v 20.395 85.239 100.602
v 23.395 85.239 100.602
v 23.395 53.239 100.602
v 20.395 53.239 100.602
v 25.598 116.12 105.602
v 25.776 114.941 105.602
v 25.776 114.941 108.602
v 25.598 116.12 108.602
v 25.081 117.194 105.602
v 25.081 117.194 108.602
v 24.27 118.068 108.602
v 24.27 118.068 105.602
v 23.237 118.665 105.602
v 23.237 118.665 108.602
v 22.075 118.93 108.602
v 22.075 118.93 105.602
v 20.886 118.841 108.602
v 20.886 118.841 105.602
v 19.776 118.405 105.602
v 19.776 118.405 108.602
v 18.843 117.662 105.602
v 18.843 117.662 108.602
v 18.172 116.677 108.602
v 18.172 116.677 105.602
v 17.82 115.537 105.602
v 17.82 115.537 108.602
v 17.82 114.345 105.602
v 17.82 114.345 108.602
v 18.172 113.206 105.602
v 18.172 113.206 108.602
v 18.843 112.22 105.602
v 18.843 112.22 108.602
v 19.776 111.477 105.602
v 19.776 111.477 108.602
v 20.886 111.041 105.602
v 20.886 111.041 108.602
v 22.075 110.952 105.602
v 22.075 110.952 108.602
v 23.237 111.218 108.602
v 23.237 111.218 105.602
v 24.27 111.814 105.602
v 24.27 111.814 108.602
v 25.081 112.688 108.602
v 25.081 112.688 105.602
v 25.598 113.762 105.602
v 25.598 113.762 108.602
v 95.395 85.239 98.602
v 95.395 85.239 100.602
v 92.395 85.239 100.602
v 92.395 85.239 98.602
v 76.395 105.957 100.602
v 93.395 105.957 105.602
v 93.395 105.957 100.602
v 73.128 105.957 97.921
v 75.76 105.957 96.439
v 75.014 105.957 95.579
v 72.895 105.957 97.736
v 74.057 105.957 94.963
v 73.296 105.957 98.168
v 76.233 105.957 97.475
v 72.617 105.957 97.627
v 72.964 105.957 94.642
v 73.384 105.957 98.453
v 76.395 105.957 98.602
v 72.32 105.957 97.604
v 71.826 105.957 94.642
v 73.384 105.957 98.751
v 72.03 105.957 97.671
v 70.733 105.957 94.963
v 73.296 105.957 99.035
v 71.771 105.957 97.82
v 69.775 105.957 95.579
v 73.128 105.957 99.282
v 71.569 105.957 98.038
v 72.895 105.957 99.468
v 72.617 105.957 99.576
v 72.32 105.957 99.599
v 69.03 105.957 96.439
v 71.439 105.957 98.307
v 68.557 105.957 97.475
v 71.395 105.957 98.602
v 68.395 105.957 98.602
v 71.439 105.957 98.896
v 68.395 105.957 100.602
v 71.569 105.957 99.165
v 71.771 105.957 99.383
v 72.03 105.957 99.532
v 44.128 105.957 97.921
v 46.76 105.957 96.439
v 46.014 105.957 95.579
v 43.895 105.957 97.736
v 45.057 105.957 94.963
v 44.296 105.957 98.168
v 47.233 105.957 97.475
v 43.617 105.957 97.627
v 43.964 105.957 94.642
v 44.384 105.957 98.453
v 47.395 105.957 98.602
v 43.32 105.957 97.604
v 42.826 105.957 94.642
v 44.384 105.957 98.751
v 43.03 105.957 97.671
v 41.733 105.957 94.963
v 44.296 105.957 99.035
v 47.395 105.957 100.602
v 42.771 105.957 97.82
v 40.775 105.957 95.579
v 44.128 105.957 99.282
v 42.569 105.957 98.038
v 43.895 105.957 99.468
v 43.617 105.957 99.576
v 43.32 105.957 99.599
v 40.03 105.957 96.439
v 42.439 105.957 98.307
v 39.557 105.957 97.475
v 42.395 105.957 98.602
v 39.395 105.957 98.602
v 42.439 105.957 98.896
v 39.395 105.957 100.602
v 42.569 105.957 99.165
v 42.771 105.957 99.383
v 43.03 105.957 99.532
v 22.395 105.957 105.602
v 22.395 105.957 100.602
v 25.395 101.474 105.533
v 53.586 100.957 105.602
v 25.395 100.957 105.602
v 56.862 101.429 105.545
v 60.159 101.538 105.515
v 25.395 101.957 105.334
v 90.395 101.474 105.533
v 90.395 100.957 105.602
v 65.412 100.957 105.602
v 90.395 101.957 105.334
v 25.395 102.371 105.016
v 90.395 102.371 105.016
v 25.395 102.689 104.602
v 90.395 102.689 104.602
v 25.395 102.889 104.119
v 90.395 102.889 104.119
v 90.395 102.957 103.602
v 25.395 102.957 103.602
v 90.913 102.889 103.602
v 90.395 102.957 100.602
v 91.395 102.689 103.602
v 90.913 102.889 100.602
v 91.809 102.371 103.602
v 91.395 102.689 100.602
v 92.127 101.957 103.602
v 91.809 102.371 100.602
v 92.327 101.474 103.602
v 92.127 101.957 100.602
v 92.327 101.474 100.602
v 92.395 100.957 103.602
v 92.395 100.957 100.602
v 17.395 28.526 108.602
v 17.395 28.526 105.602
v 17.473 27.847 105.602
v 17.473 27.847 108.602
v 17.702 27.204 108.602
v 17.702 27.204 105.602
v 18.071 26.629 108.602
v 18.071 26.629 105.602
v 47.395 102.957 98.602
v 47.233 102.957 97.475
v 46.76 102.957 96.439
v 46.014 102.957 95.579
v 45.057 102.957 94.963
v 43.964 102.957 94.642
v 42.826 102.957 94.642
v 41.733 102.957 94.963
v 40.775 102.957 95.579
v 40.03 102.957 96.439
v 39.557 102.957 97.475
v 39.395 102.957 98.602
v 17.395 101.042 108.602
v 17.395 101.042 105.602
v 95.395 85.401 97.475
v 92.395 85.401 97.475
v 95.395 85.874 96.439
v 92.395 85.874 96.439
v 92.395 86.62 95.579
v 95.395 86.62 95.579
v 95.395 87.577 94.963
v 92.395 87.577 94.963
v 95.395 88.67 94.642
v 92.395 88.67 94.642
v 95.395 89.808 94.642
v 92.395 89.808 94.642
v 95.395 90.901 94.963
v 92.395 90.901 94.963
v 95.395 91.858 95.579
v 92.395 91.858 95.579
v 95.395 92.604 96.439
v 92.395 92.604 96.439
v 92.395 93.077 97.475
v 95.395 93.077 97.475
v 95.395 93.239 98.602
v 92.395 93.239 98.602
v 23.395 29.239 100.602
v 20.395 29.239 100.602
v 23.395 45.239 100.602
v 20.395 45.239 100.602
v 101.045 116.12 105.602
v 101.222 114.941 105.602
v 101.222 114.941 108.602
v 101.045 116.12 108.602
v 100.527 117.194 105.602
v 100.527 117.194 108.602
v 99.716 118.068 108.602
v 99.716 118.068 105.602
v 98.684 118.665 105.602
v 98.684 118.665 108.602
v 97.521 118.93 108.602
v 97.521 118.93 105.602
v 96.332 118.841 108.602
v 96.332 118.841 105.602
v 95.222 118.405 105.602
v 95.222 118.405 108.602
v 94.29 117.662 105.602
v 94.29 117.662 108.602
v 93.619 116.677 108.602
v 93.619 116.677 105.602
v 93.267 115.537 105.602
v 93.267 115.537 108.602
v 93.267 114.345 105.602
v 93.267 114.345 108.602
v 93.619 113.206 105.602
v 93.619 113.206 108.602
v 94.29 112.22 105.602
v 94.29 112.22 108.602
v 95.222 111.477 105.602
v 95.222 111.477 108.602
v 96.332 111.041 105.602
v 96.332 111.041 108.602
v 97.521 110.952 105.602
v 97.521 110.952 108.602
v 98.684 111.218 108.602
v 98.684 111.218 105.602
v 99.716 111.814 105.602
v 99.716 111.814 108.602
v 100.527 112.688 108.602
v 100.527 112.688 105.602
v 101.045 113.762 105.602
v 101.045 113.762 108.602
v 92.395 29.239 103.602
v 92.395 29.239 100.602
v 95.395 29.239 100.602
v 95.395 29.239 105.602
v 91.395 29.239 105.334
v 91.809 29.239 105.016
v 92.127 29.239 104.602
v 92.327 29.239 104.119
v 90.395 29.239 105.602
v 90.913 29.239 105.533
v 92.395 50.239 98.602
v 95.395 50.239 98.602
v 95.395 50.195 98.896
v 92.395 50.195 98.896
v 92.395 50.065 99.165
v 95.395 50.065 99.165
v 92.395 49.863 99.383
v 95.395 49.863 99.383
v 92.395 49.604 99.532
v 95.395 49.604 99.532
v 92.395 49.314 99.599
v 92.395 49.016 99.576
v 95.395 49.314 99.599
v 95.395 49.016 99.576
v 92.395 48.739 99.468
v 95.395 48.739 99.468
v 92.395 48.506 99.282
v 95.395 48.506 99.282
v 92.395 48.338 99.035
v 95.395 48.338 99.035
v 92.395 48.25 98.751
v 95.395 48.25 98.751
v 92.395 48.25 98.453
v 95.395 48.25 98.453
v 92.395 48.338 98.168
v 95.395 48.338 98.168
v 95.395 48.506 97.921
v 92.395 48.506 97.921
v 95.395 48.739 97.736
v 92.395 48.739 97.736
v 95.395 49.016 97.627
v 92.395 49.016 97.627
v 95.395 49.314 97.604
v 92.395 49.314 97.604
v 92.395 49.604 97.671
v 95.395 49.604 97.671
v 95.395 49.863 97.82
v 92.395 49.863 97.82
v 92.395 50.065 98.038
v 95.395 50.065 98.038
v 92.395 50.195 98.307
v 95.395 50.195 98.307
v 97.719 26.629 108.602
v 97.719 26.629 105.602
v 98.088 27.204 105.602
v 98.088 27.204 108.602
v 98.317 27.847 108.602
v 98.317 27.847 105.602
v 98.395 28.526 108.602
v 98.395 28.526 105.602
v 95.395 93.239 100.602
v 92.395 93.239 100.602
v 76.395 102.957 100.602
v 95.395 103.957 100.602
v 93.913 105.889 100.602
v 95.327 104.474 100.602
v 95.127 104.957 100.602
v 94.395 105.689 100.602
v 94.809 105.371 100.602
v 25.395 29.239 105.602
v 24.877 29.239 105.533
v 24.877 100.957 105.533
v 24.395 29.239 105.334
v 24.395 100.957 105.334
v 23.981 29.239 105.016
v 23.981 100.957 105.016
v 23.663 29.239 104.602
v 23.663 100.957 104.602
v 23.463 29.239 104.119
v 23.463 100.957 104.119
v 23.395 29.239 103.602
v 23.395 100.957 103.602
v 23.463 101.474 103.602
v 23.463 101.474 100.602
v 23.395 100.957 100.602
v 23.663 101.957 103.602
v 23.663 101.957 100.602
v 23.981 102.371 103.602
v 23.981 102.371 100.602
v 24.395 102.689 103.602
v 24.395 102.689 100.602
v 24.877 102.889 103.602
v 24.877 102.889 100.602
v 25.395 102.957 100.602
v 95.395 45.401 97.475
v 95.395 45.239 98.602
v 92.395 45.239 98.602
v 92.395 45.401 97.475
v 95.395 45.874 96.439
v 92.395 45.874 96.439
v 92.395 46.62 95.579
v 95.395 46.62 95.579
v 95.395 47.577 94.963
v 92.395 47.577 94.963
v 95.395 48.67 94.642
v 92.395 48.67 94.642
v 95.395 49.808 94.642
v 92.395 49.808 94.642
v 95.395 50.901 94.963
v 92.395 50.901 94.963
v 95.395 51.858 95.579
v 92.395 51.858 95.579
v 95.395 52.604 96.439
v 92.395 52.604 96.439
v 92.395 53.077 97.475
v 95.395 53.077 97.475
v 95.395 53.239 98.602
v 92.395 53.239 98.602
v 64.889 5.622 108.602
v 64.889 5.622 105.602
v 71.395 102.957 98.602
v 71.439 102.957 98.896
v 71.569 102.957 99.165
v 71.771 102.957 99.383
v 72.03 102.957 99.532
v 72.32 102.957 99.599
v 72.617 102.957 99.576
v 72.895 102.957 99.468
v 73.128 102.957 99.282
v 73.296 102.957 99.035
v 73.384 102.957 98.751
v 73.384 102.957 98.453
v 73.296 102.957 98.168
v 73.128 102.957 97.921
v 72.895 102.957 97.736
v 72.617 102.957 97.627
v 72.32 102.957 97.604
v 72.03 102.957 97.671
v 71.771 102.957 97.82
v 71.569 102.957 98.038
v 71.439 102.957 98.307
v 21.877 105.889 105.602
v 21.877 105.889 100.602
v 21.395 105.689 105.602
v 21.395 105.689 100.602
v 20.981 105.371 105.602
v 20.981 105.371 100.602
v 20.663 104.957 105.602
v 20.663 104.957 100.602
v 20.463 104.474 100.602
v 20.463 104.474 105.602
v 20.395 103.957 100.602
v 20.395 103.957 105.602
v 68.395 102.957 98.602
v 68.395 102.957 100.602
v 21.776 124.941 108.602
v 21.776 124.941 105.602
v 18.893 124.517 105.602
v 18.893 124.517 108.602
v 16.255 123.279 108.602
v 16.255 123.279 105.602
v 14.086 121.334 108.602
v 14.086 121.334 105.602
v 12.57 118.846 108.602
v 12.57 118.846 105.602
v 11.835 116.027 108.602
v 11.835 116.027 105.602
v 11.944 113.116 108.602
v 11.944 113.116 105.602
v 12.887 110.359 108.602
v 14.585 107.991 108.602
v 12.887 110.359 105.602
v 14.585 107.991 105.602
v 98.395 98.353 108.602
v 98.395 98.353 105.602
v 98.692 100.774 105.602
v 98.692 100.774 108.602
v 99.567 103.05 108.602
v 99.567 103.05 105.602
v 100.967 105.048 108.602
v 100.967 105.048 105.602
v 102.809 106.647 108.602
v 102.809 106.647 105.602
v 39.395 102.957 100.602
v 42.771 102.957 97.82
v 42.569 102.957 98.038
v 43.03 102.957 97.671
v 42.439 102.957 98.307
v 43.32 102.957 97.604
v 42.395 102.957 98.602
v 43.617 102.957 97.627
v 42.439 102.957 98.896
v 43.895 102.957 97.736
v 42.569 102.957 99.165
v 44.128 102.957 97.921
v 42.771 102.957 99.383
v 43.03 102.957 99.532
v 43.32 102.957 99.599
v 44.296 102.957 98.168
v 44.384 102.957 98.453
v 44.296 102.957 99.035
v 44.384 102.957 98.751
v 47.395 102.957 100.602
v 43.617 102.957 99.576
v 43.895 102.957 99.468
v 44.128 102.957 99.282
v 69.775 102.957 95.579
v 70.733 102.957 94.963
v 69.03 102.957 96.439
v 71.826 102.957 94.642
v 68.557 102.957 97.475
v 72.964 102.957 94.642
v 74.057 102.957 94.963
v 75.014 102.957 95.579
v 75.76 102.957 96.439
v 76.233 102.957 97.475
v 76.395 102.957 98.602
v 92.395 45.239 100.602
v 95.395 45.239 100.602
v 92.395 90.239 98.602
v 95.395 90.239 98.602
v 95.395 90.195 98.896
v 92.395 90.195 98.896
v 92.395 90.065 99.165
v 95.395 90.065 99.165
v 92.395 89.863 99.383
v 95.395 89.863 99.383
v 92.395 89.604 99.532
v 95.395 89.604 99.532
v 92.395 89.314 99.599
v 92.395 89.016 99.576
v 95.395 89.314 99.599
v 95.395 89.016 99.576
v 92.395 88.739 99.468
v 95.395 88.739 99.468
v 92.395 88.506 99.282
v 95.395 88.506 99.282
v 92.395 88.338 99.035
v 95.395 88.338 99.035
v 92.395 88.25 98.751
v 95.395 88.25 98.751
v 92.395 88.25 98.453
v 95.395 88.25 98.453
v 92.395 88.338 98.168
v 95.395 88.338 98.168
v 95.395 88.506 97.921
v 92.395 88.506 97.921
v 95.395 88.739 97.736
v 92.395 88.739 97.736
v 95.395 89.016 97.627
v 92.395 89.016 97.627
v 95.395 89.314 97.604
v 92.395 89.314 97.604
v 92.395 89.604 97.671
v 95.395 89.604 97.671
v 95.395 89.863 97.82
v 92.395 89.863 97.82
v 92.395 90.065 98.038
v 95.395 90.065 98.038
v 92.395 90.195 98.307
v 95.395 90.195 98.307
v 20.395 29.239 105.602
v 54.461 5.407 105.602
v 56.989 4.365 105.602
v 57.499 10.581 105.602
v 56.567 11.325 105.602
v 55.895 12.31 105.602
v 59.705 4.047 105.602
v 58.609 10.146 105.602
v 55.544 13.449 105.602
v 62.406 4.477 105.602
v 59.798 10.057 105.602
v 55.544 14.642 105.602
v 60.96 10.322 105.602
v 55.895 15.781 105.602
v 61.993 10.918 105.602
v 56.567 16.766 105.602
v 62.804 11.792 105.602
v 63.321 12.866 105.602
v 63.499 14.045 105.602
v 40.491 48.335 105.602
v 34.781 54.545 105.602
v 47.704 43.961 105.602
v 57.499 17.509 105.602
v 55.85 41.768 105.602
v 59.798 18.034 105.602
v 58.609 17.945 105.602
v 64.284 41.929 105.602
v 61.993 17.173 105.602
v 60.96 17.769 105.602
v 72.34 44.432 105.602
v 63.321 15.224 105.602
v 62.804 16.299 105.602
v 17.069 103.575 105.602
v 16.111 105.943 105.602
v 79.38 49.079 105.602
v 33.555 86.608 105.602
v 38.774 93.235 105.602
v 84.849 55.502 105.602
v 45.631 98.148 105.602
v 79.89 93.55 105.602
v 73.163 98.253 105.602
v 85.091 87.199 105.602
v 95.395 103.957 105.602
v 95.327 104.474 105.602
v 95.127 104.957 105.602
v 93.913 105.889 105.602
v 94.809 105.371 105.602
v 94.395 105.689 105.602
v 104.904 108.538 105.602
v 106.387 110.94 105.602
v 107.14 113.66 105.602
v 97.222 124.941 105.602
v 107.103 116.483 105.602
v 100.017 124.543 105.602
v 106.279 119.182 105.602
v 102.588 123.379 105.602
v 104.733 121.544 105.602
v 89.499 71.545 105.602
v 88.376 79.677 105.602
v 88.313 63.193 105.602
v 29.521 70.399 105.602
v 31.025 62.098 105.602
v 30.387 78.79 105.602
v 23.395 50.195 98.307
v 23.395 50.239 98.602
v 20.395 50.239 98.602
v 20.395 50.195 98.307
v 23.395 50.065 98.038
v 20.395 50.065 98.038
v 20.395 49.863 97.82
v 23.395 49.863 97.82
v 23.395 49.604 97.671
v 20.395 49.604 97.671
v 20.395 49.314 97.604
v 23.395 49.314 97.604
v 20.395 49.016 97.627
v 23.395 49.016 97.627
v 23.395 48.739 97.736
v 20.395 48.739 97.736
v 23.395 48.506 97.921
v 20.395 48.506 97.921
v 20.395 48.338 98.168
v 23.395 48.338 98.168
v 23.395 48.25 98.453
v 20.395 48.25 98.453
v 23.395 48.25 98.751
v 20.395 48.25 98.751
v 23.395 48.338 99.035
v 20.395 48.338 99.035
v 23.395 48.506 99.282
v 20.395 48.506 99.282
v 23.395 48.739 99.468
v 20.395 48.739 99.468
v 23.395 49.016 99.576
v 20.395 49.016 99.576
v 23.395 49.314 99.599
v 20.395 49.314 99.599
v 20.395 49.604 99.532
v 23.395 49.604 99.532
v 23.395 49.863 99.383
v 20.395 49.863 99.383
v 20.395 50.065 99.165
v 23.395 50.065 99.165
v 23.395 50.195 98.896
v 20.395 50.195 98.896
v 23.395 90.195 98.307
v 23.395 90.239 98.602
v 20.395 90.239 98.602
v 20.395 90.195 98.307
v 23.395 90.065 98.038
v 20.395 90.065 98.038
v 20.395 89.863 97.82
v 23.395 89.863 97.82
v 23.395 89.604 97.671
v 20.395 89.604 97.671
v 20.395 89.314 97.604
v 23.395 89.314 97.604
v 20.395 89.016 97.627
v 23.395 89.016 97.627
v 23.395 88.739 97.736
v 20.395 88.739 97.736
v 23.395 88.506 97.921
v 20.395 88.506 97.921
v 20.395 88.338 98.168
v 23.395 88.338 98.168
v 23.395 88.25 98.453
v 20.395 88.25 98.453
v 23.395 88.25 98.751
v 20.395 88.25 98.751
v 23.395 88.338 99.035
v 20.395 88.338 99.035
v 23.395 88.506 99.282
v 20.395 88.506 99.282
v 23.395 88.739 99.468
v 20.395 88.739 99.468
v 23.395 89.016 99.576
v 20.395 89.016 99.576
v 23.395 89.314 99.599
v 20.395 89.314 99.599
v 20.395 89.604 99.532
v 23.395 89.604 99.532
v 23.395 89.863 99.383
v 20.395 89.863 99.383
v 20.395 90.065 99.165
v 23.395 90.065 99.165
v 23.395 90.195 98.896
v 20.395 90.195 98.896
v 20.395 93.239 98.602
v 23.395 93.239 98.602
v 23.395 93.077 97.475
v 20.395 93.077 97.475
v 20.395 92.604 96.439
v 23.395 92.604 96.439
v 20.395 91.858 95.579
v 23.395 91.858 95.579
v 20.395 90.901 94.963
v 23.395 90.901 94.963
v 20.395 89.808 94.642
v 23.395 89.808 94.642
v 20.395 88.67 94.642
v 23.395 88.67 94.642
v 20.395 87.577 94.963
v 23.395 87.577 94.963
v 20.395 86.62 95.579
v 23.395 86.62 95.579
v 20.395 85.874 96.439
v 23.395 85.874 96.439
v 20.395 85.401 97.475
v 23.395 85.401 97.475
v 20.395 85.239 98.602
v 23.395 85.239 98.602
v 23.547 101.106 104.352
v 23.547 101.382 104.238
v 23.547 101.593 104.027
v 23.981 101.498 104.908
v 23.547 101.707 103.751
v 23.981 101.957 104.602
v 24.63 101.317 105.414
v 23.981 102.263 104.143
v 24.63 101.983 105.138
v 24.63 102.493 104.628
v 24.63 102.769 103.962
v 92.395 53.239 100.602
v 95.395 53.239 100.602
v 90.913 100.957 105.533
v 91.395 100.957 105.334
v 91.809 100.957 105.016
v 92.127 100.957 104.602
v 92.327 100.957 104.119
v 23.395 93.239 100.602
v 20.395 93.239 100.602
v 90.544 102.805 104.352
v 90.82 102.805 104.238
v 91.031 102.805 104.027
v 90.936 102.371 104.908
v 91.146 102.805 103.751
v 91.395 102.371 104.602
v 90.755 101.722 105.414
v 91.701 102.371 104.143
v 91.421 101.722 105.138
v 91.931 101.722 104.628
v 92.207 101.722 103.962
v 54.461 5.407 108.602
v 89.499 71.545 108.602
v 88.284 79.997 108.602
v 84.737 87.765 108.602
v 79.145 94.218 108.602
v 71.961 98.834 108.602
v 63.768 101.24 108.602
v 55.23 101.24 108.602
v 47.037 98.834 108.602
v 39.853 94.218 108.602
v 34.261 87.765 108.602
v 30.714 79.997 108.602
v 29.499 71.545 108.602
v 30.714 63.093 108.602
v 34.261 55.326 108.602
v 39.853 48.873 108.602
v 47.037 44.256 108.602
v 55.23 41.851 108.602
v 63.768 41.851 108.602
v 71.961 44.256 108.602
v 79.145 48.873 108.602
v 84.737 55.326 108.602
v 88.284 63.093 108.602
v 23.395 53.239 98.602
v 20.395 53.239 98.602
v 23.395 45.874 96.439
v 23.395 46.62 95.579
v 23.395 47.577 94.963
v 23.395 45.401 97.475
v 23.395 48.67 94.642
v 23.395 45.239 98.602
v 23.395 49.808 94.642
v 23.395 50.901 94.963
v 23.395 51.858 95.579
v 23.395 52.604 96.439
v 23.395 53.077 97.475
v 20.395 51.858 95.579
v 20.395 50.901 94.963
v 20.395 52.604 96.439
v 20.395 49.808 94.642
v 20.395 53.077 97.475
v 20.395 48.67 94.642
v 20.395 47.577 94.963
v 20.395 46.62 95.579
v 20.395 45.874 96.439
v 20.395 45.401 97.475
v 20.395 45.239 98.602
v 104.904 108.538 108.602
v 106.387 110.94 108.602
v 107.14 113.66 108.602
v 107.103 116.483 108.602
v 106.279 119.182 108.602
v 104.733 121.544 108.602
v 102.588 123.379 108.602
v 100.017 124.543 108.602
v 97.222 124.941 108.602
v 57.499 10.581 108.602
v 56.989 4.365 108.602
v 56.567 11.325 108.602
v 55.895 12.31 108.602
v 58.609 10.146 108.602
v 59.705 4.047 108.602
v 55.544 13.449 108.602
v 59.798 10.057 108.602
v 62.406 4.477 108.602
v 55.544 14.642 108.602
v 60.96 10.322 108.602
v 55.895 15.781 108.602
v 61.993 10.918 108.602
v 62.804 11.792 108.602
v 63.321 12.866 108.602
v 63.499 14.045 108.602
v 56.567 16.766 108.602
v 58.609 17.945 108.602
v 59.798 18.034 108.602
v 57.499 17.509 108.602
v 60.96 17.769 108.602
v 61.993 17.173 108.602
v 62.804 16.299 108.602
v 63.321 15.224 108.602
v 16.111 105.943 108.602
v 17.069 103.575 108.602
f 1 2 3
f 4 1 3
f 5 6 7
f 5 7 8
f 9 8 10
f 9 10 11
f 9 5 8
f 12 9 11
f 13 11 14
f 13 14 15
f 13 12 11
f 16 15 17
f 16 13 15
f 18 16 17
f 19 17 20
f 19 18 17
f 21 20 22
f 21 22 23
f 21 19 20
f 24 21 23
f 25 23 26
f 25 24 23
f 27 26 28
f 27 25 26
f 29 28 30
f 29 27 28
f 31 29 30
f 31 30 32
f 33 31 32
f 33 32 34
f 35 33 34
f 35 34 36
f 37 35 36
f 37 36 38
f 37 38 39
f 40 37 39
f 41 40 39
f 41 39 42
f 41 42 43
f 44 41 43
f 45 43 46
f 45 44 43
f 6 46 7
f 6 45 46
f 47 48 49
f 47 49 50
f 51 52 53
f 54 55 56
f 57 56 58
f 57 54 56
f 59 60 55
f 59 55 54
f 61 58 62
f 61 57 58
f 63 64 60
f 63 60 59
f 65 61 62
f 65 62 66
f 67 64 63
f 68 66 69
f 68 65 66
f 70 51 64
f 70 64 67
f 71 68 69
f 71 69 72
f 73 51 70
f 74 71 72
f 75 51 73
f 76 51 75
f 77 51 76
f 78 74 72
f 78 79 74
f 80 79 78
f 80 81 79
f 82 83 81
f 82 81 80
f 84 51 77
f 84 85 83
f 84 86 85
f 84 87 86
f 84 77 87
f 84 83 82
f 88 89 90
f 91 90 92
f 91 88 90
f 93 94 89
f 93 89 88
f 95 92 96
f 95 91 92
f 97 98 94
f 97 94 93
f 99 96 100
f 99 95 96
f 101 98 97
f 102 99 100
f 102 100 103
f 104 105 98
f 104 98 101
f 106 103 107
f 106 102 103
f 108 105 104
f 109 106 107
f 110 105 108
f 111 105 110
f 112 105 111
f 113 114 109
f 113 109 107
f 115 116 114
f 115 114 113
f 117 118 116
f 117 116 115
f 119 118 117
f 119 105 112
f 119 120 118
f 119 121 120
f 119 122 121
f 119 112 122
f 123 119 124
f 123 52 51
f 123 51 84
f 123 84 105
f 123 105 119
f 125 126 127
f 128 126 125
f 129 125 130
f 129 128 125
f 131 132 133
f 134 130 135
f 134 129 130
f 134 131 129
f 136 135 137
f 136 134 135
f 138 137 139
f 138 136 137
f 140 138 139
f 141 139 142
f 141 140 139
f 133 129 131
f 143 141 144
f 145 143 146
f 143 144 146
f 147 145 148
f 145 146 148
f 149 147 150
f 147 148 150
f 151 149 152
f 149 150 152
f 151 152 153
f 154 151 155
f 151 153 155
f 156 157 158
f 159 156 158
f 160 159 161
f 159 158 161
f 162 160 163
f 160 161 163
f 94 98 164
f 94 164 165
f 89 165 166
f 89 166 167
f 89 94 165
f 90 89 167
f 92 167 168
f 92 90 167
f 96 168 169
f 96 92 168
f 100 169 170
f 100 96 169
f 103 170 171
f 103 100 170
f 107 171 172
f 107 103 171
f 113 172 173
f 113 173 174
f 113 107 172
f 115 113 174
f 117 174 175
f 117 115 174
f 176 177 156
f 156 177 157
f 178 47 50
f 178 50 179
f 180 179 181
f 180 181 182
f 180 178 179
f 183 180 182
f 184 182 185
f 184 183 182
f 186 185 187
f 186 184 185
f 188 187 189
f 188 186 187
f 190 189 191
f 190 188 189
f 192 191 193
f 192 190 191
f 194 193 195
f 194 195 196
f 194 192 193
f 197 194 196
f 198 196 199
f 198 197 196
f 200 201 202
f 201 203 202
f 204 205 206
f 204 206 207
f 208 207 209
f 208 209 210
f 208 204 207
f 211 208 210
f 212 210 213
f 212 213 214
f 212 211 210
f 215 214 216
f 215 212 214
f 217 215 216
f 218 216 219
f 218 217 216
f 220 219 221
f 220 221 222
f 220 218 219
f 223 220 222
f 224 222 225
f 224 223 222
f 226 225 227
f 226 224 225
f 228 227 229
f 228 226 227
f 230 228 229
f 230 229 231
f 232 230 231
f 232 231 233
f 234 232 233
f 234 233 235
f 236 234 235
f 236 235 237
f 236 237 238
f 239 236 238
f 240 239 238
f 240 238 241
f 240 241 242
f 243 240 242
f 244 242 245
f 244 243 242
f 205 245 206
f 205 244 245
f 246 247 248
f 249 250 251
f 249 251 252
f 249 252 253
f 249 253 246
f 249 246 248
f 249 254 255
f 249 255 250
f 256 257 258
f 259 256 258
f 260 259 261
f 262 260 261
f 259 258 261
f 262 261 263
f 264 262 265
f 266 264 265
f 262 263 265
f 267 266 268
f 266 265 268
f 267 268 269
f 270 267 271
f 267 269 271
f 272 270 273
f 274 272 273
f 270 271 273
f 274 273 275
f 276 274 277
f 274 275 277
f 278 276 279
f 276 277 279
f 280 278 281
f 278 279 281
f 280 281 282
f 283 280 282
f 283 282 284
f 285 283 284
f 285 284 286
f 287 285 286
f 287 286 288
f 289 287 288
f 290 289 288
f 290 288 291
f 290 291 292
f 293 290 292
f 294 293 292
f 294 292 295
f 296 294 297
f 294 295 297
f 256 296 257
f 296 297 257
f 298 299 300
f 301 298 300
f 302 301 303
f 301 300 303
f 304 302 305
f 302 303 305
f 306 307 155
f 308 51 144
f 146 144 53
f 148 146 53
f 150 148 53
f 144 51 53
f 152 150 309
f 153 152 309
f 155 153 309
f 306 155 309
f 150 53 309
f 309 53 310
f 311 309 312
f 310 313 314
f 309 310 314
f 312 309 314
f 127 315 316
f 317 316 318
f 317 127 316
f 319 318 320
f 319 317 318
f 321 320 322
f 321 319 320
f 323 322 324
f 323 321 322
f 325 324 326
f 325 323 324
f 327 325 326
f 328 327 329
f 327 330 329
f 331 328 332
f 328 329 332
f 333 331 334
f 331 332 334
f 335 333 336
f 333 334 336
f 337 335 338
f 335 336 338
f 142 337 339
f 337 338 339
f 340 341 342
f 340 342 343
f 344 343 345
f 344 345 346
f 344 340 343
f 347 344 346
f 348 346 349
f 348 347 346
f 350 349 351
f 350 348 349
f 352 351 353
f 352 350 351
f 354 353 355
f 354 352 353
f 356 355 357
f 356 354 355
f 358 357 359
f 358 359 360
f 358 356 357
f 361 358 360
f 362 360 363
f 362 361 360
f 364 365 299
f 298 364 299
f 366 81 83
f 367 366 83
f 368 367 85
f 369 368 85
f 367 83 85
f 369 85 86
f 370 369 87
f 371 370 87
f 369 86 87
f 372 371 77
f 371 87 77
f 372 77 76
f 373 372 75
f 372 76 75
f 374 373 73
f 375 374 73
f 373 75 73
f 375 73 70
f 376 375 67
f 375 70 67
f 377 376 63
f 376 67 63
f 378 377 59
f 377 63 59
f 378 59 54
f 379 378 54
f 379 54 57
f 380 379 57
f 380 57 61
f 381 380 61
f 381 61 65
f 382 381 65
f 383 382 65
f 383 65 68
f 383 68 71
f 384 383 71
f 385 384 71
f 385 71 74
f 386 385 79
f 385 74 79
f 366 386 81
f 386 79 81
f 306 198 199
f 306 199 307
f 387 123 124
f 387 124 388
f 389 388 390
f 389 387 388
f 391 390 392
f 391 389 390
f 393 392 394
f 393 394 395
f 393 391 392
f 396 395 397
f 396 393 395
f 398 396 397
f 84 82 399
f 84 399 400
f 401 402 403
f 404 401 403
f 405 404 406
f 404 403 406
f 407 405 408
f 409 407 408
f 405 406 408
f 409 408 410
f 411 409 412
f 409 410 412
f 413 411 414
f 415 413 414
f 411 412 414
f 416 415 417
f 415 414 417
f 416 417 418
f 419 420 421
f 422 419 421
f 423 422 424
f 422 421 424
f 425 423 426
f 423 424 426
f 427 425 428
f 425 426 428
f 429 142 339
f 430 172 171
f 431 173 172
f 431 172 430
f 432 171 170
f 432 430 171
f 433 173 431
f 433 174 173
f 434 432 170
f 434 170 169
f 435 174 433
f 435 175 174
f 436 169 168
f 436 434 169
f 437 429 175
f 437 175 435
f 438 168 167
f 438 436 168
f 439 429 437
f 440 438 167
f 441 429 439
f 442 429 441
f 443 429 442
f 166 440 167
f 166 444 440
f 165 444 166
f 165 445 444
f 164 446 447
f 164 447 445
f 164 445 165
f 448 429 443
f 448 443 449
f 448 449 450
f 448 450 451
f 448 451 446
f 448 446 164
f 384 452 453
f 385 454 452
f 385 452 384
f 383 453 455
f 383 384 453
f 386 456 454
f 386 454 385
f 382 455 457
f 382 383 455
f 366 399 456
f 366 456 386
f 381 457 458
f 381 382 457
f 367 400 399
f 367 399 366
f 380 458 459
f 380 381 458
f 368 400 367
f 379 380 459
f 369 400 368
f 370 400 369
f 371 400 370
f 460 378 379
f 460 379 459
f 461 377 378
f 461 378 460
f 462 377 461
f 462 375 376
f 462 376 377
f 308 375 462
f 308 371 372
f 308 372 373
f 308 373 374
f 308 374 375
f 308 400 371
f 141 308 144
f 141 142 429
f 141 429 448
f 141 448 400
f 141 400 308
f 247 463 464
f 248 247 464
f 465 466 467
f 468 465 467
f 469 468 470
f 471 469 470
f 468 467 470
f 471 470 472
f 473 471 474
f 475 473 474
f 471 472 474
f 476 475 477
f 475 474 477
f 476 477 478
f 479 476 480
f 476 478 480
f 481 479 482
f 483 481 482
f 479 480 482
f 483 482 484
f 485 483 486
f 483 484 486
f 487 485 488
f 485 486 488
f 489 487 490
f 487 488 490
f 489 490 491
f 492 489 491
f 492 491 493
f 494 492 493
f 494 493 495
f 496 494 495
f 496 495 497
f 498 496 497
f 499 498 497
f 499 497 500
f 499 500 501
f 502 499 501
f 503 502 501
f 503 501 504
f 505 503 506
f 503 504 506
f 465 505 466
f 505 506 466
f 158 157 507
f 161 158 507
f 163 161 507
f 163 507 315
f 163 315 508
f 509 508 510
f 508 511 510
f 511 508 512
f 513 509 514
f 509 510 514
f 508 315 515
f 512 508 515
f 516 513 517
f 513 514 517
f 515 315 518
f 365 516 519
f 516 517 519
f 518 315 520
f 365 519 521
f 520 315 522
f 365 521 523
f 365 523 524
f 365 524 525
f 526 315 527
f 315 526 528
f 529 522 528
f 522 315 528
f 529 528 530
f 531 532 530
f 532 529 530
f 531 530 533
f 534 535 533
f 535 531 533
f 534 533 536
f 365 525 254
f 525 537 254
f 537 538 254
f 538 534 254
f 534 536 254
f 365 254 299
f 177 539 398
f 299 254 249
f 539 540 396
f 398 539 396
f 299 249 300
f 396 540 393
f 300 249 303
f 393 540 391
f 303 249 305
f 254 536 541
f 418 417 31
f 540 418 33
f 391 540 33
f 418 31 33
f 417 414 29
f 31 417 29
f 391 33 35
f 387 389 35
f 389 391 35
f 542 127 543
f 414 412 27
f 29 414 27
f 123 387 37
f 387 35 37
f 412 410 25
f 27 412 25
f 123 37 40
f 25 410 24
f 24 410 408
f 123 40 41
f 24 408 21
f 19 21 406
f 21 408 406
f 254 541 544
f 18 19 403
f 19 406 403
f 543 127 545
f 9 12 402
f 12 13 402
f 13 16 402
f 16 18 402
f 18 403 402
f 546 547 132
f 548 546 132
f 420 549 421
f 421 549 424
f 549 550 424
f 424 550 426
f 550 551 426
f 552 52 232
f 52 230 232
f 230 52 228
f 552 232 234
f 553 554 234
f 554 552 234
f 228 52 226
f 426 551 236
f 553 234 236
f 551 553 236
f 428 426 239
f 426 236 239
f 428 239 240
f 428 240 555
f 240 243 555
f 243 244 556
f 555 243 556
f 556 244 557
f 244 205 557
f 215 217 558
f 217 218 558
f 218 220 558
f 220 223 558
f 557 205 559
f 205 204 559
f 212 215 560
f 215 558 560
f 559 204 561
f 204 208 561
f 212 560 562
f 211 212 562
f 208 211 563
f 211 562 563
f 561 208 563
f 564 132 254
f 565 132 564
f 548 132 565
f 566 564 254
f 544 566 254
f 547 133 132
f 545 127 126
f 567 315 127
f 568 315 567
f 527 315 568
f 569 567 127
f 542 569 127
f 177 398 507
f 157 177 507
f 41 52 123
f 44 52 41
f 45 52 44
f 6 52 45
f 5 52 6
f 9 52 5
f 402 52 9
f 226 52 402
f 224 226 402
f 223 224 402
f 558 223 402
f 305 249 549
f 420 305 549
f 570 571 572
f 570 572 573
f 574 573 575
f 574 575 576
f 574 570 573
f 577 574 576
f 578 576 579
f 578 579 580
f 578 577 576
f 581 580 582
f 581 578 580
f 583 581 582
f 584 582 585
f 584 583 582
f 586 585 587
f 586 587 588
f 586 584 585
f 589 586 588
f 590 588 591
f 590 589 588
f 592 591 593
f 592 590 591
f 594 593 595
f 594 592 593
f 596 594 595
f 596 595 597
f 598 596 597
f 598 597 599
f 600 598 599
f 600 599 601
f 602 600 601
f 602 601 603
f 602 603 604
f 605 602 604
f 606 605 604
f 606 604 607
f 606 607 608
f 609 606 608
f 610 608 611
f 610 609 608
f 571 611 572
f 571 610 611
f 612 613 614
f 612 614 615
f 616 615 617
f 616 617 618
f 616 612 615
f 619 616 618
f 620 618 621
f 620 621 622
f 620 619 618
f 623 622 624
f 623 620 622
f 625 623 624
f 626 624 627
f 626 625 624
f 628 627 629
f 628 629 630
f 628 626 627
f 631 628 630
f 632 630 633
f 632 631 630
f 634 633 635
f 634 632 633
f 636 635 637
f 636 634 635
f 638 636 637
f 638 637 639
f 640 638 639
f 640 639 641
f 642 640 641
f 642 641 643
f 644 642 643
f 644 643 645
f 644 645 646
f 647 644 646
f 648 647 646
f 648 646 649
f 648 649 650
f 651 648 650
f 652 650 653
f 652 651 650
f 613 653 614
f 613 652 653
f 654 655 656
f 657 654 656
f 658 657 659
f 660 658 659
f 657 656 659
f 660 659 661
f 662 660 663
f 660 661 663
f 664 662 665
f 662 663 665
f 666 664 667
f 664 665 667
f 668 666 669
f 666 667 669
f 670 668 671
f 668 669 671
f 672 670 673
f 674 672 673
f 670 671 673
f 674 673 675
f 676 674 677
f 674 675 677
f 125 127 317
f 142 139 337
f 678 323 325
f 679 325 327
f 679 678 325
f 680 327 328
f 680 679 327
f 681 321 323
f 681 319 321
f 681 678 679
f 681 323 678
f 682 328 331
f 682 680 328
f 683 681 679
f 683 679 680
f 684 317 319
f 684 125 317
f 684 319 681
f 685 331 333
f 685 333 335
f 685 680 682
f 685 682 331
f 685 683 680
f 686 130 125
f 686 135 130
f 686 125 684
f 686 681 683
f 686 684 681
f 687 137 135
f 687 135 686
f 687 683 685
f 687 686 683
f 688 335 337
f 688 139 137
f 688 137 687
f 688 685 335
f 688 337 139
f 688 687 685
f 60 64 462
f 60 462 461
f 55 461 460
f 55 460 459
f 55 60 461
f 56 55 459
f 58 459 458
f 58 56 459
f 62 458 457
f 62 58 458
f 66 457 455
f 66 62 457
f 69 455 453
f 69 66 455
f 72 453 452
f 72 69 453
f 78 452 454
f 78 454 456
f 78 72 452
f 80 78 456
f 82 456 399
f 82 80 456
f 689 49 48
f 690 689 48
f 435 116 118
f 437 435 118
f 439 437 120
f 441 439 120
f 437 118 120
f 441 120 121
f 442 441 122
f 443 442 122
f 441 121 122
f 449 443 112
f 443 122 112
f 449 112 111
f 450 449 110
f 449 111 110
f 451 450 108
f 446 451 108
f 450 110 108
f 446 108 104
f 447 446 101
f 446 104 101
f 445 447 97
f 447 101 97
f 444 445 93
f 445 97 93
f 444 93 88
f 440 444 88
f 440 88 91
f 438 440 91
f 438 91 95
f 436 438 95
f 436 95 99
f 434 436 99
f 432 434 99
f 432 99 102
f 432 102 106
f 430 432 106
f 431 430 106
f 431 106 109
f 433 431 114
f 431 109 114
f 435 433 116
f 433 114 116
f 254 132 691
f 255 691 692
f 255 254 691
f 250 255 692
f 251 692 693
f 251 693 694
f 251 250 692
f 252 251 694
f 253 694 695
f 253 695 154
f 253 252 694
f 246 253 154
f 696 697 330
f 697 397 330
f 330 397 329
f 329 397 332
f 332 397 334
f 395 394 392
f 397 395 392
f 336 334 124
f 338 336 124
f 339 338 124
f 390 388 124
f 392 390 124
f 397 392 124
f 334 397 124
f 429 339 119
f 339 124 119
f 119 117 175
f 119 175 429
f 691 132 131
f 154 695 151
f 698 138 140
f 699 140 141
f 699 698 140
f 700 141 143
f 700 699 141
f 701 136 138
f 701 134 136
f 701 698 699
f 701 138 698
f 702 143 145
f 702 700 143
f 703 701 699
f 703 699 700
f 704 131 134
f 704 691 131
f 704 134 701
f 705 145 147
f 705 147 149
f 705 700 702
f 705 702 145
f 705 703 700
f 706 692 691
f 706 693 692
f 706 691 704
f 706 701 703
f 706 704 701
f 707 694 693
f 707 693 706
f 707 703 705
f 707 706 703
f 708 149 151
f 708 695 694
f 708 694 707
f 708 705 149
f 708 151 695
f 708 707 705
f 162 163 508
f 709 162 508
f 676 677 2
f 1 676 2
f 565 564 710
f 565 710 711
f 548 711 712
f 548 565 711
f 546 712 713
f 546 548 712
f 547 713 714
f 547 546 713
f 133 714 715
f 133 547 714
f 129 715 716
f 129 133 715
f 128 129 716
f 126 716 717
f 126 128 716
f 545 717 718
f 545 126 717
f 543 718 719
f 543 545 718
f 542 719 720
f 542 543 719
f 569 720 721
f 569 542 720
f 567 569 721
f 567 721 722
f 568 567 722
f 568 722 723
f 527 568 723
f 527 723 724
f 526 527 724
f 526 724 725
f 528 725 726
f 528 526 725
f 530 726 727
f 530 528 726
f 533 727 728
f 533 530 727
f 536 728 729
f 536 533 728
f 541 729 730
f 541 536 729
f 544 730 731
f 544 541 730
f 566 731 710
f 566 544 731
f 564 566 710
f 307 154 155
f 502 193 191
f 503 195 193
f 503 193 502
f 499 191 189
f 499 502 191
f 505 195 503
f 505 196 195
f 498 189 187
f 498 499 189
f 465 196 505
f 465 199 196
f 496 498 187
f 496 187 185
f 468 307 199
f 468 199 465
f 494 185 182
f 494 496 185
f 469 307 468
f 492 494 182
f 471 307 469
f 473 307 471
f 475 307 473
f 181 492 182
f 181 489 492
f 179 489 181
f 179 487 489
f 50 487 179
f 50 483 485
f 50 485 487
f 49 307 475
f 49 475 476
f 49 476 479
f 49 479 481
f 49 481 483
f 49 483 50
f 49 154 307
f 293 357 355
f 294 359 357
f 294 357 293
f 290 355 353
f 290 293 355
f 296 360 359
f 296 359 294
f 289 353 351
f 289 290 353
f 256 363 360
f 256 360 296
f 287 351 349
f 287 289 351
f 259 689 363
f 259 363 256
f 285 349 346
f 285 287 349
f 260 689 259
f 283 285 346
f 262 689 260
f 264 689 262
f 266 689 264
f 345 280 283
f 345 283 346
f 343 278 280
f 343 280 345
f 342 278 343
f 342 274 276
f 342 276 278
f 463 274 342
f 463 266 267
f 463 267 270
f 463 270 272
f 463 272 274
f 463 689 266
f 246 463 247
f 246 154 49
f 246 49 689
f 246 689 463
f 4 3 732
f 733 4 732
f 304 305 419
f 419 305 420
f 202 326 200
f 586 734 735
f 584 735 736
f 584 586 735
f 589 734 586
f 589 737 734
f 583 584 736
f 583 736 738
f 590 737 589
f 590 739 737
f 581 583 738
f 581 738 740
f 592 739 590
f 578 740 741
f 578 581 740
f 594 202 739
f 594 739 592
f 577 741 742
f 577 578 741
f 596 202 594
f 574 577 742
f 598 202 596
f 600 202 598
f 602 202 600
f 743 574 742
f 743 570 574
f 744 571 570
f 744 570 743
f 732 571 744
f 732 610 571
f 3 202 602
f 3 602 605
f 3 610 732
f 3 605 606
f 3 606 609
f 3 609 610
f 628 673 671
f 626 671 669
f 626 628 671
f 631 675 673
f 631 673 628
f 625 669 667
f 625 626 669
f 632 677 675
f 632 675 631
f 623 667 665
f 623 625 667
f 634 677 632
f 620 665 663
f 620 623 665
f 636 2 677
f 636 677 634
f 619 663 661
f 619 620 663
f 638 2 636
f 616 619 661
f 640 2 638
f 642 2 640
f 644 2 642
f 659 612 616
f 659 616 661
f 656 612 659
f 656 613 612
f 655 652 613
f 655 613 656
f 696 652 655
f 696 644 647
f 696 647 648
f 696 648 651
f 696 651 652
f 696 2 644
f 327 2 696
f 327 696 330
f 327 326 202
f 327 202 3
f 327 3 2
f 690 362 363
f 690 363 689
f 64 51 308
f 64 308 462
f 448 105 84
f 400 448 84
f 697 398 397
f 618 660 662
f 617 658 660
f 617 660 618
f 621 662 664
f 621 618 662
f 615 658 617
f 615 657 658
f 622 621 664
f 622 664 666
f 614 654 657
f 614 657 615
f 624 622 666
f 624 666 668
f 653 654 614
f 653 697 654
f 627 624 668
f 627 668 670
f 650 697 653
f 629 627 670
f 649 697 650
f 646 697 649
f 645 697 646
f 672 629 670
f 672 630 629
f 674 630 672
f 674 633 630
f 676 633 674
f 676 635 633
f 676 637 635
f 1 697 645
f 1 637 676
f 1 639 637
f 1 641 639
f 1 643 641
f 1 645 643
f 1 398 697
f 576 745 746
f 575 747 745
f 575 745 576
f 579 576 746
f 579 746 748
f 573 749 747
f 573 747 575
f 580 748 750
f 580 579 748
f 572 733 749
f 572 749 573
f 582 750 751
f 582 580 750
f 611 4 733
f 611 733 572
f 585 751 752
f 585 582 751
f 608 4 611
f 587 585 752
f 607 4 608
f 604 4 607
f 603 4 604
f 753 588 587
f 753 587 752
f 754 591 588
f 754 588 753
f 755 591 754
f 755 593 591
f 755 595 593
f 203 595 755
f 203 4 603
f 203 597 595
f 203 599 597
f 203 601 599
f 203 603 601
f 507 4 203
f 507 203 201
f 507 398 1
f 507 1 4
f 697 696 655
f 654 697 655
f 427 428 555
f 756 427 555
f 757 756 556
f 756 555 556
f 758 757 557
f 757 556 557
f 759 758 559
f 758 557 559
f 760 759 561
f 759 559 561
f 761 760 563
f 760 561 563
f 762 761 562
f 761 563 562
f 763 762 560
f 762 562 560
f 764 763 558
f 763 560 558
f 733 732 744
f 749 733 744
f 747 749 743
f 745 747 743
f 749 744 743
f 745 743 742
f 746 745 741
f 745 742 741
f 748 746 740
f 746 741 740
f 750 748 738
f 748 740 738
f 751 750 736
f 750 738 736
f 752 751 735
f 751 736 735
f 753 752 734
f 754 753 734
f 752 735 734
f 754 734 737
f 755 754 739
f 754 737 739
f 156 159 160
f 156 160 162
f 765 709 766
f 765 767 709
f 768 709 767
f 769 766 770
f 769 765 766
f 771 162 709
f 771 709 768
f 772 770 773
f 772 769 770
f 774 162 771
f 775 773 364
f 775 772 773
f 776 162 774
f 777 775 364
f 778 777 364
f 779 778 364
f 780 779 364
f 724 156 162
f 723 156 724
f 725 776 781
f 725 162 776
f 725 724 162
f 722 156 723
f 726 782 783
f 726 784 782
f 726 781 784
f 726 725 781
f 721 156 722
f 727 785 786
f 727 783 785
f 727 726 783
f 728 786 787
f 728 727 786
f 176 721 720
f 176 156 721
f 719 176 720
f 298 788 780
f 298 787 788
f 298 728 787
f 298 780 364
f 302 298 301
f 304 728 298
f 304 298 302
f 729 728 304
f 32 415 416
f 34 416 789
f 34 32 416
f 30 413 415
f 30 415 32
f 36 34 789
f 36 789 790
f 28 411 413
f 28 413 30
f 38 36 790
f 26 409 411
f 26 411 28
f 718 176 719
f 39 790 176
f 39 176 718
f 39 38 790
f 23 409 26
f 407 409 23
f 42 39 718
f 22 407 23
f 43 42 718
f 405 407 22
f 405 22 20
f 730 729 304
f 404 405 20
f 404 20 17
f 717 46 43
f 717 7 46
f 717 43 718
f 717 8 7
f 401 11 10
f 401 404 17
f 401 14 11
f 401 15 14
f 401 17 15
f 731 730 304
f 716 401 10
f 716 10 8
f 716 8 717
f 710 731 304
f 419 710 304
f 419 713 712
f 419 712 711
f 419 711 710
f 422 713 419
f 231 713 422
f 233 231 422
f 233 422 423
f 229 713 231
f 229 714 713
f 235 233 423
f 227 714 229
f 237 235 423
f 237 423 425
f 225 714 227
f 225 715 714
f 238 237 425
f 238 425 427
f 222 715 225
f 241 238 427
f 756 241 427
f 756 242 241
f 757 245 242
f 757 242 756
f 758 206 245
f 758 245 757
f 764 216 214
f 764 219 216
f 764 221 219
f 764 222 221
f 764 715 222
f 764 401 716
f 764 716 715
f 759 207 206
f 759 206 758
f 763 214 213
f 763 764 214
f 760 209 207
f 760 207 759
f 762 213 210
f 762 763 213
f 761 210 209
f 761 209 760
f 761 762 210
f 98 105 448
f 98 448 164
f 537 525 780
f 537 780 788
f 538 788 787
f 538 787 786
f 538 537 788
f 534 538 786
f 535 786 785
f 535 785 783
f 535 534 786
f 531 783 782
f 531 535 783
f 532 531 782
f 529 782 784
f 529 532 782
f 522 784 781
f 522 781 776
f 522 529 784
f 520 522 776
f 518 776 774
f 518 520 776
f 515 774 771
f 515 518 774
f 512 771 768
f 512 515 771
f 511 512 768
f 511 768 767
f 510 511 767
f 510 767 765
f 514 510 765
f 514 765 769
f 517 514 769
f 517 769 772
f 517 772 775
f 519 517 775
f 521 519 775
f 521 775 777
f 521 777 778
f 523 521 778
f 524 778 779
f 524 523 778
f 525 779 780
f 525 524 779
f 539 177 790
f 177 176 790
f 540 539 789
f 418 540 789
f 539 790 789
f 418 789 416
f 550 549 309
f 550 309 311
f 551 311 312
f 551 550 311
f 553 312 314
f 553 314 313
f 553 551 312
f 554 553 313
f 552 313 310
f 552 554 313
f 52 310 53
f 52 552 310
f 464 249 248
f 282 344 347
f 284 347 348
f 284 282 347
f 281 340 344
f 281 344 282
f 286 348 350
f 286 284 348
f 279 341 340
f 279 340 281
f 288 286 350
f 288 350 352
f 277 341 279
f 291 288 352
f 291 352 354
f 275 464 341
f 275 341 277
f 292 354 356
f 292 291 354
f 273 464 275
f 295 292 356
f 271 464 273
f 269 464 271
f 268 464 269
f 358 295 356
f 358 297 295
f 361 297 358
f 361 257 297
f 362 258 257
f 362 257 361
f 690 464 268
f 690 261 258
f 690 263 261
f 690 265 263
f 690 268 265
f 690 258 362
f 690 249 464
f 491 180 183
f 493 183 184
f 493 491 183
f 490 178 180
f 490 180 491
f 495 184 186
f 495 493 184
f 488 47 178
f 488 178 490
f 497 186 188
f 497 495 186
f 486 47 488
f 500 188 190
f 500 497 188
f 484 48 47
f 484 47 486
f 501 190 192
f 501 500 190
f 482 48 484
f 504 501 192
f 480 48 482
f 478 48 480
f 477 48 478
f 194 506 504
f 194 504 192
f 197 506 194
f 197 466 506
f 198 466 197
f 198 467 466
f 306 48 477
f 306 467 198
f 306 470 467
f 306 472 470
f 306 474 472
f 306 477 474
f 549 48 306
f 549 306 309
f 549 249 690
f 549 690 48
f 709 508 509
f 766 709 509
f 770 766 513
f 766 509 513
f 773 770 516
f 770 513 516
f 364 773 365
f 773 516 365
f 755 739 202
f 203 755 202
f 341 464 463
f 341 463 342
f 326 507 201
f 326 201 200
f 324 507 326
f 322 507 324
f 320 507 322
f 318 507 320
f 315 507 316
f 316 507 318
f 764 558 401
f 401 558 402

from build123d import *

# Parameters (mm, degrees)
CASING_EDGE_PROFILE_DEPTH                 = 3
SCREWHOLES_START                          = -3
SKETCH2_R                                 = 4
SCREWHOLES_AND_OTHER_STUFF_DEPTH          = 3
CASING_LIP_DEPTH                          = 5
CASING_LIP_FILLET_2MM_R                   = 2
FILLET_I_MISSED_IN_SCREWHOLE_ET_AL_SKET_R = 10
SKETCH4_R                                 = 1
SIDE_SCREWHOLES_1_DEPTH                   = 3
SIDE_START                                = -3
SKETCH6_R                                 = 1
SIDE_SCREWHOLES_2_DEPTH                   = 3
SKETCH7_R                                 = 1
TOP_SCREWHOLES_DEPTH                      = 3
CAMERA_HOLE_DEPTH                         = 166.235974691
CAMERA_HOLE_DEPTH_BACK                    = 166.235974691
SKETCH9_R                                 = 30


with BuildPart() as part:
    # Sketch1 → Casing edge profile (new body)
    with BuildSketch(Plane.XY.offset(105.601550083)):
        with BuildLine():
            Line((93.845211173, 26.628512047), (97.718517255, 26.628512047))
            ThreePointArc((97.718517255, 26.628512047), (98.220764918, 27.518839518), (98.394920872, 28.526115759))
            Line((98.394920872, 28.526115759), (98.394920872, 105.956761374))
            ThreePointArc((98.394920872, 105.956761374), (97.516241216, 108.078081718), (95.394920872, 108.956761374))
            Line((95.394920872, 108.956761374), (20.394920872, 108.956761374))
            ThreePointArc((20.394920872, 108.956761374), (18.273600528, 108.078081718), (17.394920872, 105.956761374))
            Line((17.394920872, 105.956761374), (17.394920872, 28.526115759))
            ThreePointArc((17.394920872, 28.526115759), (17.569076826, 27.518839518), (18.071324489, 26.628512047))
            Line((18.071324489, 26.628512047), (21.944630571, 26.628512047))
            Line((21.944630571, 26.628512047), (20.845856617, 27.973949541))
            ThreePointArc((20.845856617, 27.973949541), (20.511024841, 28.567501189), (20.394920872, 29.239018683))
            Line((20.394920872, 29.239018683), (20.394920872, 103.956761374))
            ThreePointArc((20.394920872, 103.956761374), (20.98070731, 105.370974936), (22.394920872, 105.956761374))
            Line((22.394920872, 105.956761374), (93.394920872, 105.956761374))
            ThreePointArc((93.394920872, 105.956761374), (94.809134434, 105.370974936), (95.394920872, 103.956761374))
            Line((95.394920872, 103.956761374), (95.394920872, 29.239018683))
            ThreePointArc((95.394920872, 29.239018683), (95.278816903, 28.567501189), (94.943985127, 27.973949541))
            Line((94.943985127, 27.973949541), (93.845211173, 26.628512047))
        make_face()
    extrude(amount=CASING_EDGE_PROFILE_DEPTH)

    # Sketch2 → Screwholes and other stuff (add)
    # profile 1 of 3: a face of its own
    with BuildSketch(Plane.XY.offset(108.601550083).offset(SCREWHOLES_START)):
        with BuildLine():
            ThreePointArc((102.80865071, 106.646950035), (106.786425162, 117.861593749), (97.222380548, 124.941139909))
            Line((97.222380548, 124.941139909), (21.775592214, 124.941139909))
            ThreePointArc((21.775592214, 124.941139909), (12.031511294, 117.189002678), (17.394920872, 105.951717314))
            Line((17.394920872, 105.951717314), (17.394920872, 105.956761374))
            ThreePointArc((17.394920872, 105.956761374), (18.273600528, 108.078081718), (20.394920872, 108.956761374))
            Line((20.394920872, 108.956761374), (95.394920872, 108.956761374))
            ThreePointArc((95.394920872, 108.956761374), (97.516241216, 108.078081718), (98.394920872, 105.956761374))
            Line((98.394920872, 105.956761374), (98.394920872, 98.35276016))
            ThreePointArc((98.394920872, 98.35276016), (99.567047356, 103.050488248), (102.80865071, 106.646950035))
        make_face()
        with Locations((21.775592214, 114.941139909)):
            Circle(SKETCH2_R, mode=Mode.SUBTRACT)
        with Locations((97.222380548, 114.941139909)):
            Circle(SKETCH2_R, mode=Mode.SUBTRACT)
    # profile 2 of 3: a face of its own
    with BuildSketch(Plane.XY.offset(108.601550083).offset(SCREWHOLES_START)):
        with BuildLine():
            Line((17.394920872, 105.956761374), (17.394920872, 105.951717314))
            Line((17.394920872, 105.951717314), (17.394920872, 28.526115759))
            ThreePointArc((17.394920872, 28.526115759), (17.569076826, 27.518839518), (18.071324489, 26.628512047))
            Line((18.071324489, 26.628512047), (21.944630571, 26.628512047))
            Line((21.944630571, 26.628512047), (20.845856617, 27.973949541))
            ThreePointArc((20.845856617, 27.973949541), (20.511024841, 28.567501189), (20.394920872, 29.239018683))
            Line((20.394920872, 29.239018683), (20.394920872, 103.956761374))
            ThreePointArc((20.394920872, 103.956761374), (20.98070731, 105.370974936), (22.394920872, 105.956761374))
            Line((22.394920872, 105.956761374), (93.394920872, 105.956761374))
            ThreePointArc((93.394920872, 105.956761374), (94.809134434, 105.370974936), (95.394920872, 103.956761374))
            Line((95.394920872, 103.956761374), (95.394920872, 29.239018683))
            ThreePointArc((95.394920872, 29.239018683), (95.278816903, 28.567501189), (94.943985127, 27.973949541))
            Line((94.943985127, 27.973949541), (93.845211173, 26.628512047))
            Line((93.845211173, 26.628512047), (97.718517255, 26.628512047))
            ThreePointArc((97.718517255, 26.628512047), (98.220764918, 27.518839518), (98.394920872, 28.526115759))
            Line((98.394920872, 28.526115759), (98.394920872, 98.35276016))
            Line((98.394920872, 98.35276016), (98.394920872, 105.956761374))
            ThreePointArc((98.394920872, 105.956761374), (97.516241216, 108.078081718), (95.394920872, 108.956761374))
            Line((95.394920872, 108.956761374), (20.394920872, 108.956761374))
            ThreePointArc((20.394920872, 108.956761374), (18.273600528, 108.078081718), (17.394920872, 105.956761374))
        make_face()
    # profile 3 of 3: a face of its own
    with BuildSketch(Plane.XY.offset(108.601550083).offset(SCREWHOLES_START)):
        with BuildLine():
            Line((18.071324489, 26.628512047), (54.461325843, 5.406937788))
            ThreePointArc((54.461325843, 5.406937788), (59.705268559, 4.04746689), (64.888673445, 5.622081164))
            Line((64.888673445, 5.622081164), (97.718517255, 26.628512047))
            Line((97.718517255, 26.628512047), (93.845211173, 26.628512047))
            Line((93.845211173, 26.628512047), (94.943985127, 27.973949541))
            ThreePointArc((94.943985127, 27.973949541), (95.278816903, 28.567501189), (95.394920872, 29.239018683))
            Line((95.394920872, 29.239018683), (95.394920872, 103.956761374))
            ThreePointArc((95.394920872, 103.956761374), (94.809134434, 105.370974936), (93.394920872, 105.956761374))
            Line((93.394920872, 105.956761374), (22.394920872, 105.956761374))
            ThreePointArc((22.394920872, 105.956761374), (20.98070731, 105.370974936), (20.394920872, 103.956761374))
            Line((20.394920872, 103.956761374), (20.394920872, 29.239018683))
            ThreePointArc((20.394920872, 29.239018683), (20.511024841, 28.567501189), (20.845856617, 27.973949541))
            Line((20.845856617, 27.973949541), (21.944630571, 26.628512047))
            Line((21.944630571, 26.628512047), (18.071324489, 26.628512047))
        make_face()
        with Locations((59.498986381, 14.045339047)):
            Circle(SKETCH2_R, mode=Mode.SUBTRACT)
    extrude(amount=SCREWHOLES_AND_OTHER_STUFF_DEPTH)

    # Sketch3 → Casing lip (add)
    with BuildSketch(Plane(origin=(0, 0, 105.601550083), x_dir=(-1, 0, 0), z_dir=(0, 0, -1))):
        with BuildLine():
            Line((-20.394920872, 103.956761374), (-20.394920872, 29.239018683))
            Line((-20.394920872, 29.239018683), (-23.394920872, 29.239018683))
            Line((-23.394920872, 29.239018683), (-23.394920872, 102.956761374))
            Line((-23.394920872, 102.956761374), (-92.394920872, 102.956761374))
            Line((-92.394920872, 102.956761374), (-92.394920872, 29.239018683))
            Line((-92.394920872, 29.239018683), (-95.394920872, 29.239018683))
            Line((-95.394920872, 29.239018683), (-95.394920872, 103.956761374))
            ThreePointArc((-95.394920872, 103.956761374), (-94.809134434, 105.370974936), (-93.394920872, 105.956761374))
            Line((-93.394920872, 105.956761374), (-22.394920872, 105.956761374))
            ThreePointArc((-22.394920872, 105.956761374), (-20.98070731, 105.370974936), (-20.394920872, 103.956761374))
        make_face()
    extrude(amount=CASING_LIP_DEPTH)

    # Casing lip fillet 2mm
    casing_lip_fillet_2mm_edges = [part.edges().sort_by_distance(p)[0] for p in [
        (92.394920872, 66.097890028, 105.601550083),
        (57.894920872, 102.956761374, 105.601550083),
        (92.394920872, 102.956761374, 103.101550083),
        (23.394920872, 66.097890028, 105.601550083),
        (23.394920872, 102.956761374, 103.101550083),
    ]]
    fillet(casing_lip_fillet_2mm_edges, radius=CASING_LIP_FILLET_2MM_R)

    # Fillet I missed in screwhole et al. sketch
    fillet_i_missed_in_screwhole_et_al_sket_edges = [part.edges().sort_by_distance(p)[0] for p in [
        (17.394920872, 105.951717314, 107.101550083),
    ]]
    fillet(fillet_i_missed_in_screwhole_et_al_sket_edges, radius=FILLET_I_MISSED_IN_SCREWHOLE_ET_AL_SKET_R)

    # Sketch4 → Side screwholes 1 (add)
    # profile 1 of 2: a face of its own
    with BuildSketch(Plane(origin=(95.394920872, 0, 0), x_dir=(0, 0, -1), z_dir=(1, 0, 0))):
        with BuildLine():
            Line((-98.601550083, 93.239018683), (-100.601550083, 93.239018683))
            Line((-100.601550083, 93.239018683), (-100.601550083, 85.239018683))
            Line((-100.601550083, 85.239018683), (-98.601550083, 85.239018683))
            ThreePointArc((-98.601550083, 85.239018683), (-94.601550083, 89.239018683), (-98.601550083, 93.239018683))
        make_face()
        with Locations(Location((-98.601550083, 89.239018683, 0), (0, 0, 90))):
            Circle(SKETCH4_R, mode=Mode.SUBTRACT)
    # profile 2 of 2: a face of its own
    with BuildSketch(Plane(origin=(95.394920872, 0, 0), x_dir=(0, 0, -1), z_dir=(1, 0, 0))):
        with BuildLine():
            Line((-98.601550083, 53.239018683), (-100.601550083, 53.239018683))
            Line((-100.601550083, 53.239018683), (-100.601550083, 45.239018683))
            Line((-100.601550083, 45.239018683), (-98.601550083, 45.239018683))
            ThreePointArc((-98.601550083, 45.239018683), (-94.601550083, 49.239018683), (-98.601550083, 53.239018683))
        make_face()
        with Locations(Location((-98.601550083, 49.239018683, 0), (0, 0, 90))):
            Circle(SKETCH4_R, mode=Mode.SUBTRACT)
    extrude(amount=-SIDE_SCREWHOLES_1_DEPTH)

    # Sketch6 → Side screwholes 2 (add)
    with BuildSketch(Plane.ZY.offset(-20.394920872).offset(SIDE_START)):
        with BuildLine():
            Line((100.601550083, 29.239018683), (103.601550083, 29.239018683))
            Line((103.601550083, 29.239018683), (103.601550083, 100.956761374))
            Line((103.601550083, 100.956761374), (100.601550083, 100.956761374))
            Line((100.601550083, 100.956761374), (100.601550083, 93.239018683))
            Line((100.601550083, 93.239018683), (98.601550083, 93.239018683))
            ThreePointArc((98.601550083, 93.239018683), (94.601550083, 89.239018683), (98.601550083, 85.239018683))
            Line((98.601550083, 85.239018683), (100.601550083, 85.239018683))
            Line((100.601550083, 85.239018683), (100.601550083, 53.239018683))
            Line((100.601550083, 53.239018683), (98.601550083, 53.239018683))
            ThreePointArc((98.601550083, 53.239018683), (94.601550083, 49.239018683), (98.601550083, 45.239018683))
            Line((98.601550083, 45.239018683), (100.601550083, 45.239018683))
            Line((100.601550083, 45.239018683), (100.601550083, 29.239018683))
        make_face()
        with Locations(Location((98.601550083, 49.239018683, 0), (0, 0, 90))):
            Circle(SKETCH6_R, mode=Mode.SUBTRACT)
        with Locations(Location((98.601550083, 89.239018683, 0), (0, 0, 90))):
            Circle(SKETCH6_R, mode=Mode.SUBTRACT)
    extrude(amount=SIDE_SCREWHOLES_2_DEPTH)

    # Sketch7 → Top screwholes (add)
    # profile 1 of 2: a face of its own
    with BuildSketch(Plane(origin=(0, 105.956761374, 0), x_dir=(1, 0, 0), z_dir=(0, 1, 0))):
        with BuildLine():
            Line((39.394920872, -100.601550083), (47.394920872, -100.601550083))
            Line((47.394920872, -100.601550083), (47.394920872, -98.601550083))
            ThreePointArc((47.394920872, -98.601550083), (43.394920872, -94.601550083), (39.394920872, -98.601550083))
            Line((39.394920872, -98.601550083), (39.394920872, -100.601550083))
        make_face()
        with Locations(Location((43.394920872, -98.601550083, 0), (0, 0, 180))):
            Circle(SKETCH7_R, mode=Mode.SUBTRACT)
    # profile 2 of 2: a face of its own
    with BuildSketch(Plane(origin=(0, 105.956761374, 0), x_dir=(1, 0, 0), z_dir=(0, 1, 0))):
        with BuildLine():
            Line((68.394920872, -98.601550083), (68.394920872, -100.601550083))
            Line((68.394920872, -100.601550083), (76.394920872, -100.601550083))
            Line((76.394920872, -100.601550083), (76.394920872, -98.601550083))
            ThreePointArc((76.394920872, -98.601550083), (72.394920872, -94.601550083), (68.394920872, -98.601550083))
        make_face()
        with Locations(Location((72.394920872, -98.601550083, 0), (0, 0, 180))):
            Circle(SKETCH7_R, mode=Mode.SUBTRACT)
    extrude(amount=-TOP_SCREWHOLES_DEPTH)

    # Sketch9 → Camera hole (cut, two sides: drawn at the far end of the back side and taken through both)
    with BuildSketch(Plane.XY.offset(108.601550083).offset(-CAMERA_HOLE_DEPTH_BACK)):
        with Locations((59.498986381, 71.545339047)):
            Circle(SKETCH9_R)
    extrude(amount=CAMERA_HOLE_DEPTH + CAMERA_HOLE_DEPTH_BACK, mode=Mode.SUBTRACT)


solid = part.part
